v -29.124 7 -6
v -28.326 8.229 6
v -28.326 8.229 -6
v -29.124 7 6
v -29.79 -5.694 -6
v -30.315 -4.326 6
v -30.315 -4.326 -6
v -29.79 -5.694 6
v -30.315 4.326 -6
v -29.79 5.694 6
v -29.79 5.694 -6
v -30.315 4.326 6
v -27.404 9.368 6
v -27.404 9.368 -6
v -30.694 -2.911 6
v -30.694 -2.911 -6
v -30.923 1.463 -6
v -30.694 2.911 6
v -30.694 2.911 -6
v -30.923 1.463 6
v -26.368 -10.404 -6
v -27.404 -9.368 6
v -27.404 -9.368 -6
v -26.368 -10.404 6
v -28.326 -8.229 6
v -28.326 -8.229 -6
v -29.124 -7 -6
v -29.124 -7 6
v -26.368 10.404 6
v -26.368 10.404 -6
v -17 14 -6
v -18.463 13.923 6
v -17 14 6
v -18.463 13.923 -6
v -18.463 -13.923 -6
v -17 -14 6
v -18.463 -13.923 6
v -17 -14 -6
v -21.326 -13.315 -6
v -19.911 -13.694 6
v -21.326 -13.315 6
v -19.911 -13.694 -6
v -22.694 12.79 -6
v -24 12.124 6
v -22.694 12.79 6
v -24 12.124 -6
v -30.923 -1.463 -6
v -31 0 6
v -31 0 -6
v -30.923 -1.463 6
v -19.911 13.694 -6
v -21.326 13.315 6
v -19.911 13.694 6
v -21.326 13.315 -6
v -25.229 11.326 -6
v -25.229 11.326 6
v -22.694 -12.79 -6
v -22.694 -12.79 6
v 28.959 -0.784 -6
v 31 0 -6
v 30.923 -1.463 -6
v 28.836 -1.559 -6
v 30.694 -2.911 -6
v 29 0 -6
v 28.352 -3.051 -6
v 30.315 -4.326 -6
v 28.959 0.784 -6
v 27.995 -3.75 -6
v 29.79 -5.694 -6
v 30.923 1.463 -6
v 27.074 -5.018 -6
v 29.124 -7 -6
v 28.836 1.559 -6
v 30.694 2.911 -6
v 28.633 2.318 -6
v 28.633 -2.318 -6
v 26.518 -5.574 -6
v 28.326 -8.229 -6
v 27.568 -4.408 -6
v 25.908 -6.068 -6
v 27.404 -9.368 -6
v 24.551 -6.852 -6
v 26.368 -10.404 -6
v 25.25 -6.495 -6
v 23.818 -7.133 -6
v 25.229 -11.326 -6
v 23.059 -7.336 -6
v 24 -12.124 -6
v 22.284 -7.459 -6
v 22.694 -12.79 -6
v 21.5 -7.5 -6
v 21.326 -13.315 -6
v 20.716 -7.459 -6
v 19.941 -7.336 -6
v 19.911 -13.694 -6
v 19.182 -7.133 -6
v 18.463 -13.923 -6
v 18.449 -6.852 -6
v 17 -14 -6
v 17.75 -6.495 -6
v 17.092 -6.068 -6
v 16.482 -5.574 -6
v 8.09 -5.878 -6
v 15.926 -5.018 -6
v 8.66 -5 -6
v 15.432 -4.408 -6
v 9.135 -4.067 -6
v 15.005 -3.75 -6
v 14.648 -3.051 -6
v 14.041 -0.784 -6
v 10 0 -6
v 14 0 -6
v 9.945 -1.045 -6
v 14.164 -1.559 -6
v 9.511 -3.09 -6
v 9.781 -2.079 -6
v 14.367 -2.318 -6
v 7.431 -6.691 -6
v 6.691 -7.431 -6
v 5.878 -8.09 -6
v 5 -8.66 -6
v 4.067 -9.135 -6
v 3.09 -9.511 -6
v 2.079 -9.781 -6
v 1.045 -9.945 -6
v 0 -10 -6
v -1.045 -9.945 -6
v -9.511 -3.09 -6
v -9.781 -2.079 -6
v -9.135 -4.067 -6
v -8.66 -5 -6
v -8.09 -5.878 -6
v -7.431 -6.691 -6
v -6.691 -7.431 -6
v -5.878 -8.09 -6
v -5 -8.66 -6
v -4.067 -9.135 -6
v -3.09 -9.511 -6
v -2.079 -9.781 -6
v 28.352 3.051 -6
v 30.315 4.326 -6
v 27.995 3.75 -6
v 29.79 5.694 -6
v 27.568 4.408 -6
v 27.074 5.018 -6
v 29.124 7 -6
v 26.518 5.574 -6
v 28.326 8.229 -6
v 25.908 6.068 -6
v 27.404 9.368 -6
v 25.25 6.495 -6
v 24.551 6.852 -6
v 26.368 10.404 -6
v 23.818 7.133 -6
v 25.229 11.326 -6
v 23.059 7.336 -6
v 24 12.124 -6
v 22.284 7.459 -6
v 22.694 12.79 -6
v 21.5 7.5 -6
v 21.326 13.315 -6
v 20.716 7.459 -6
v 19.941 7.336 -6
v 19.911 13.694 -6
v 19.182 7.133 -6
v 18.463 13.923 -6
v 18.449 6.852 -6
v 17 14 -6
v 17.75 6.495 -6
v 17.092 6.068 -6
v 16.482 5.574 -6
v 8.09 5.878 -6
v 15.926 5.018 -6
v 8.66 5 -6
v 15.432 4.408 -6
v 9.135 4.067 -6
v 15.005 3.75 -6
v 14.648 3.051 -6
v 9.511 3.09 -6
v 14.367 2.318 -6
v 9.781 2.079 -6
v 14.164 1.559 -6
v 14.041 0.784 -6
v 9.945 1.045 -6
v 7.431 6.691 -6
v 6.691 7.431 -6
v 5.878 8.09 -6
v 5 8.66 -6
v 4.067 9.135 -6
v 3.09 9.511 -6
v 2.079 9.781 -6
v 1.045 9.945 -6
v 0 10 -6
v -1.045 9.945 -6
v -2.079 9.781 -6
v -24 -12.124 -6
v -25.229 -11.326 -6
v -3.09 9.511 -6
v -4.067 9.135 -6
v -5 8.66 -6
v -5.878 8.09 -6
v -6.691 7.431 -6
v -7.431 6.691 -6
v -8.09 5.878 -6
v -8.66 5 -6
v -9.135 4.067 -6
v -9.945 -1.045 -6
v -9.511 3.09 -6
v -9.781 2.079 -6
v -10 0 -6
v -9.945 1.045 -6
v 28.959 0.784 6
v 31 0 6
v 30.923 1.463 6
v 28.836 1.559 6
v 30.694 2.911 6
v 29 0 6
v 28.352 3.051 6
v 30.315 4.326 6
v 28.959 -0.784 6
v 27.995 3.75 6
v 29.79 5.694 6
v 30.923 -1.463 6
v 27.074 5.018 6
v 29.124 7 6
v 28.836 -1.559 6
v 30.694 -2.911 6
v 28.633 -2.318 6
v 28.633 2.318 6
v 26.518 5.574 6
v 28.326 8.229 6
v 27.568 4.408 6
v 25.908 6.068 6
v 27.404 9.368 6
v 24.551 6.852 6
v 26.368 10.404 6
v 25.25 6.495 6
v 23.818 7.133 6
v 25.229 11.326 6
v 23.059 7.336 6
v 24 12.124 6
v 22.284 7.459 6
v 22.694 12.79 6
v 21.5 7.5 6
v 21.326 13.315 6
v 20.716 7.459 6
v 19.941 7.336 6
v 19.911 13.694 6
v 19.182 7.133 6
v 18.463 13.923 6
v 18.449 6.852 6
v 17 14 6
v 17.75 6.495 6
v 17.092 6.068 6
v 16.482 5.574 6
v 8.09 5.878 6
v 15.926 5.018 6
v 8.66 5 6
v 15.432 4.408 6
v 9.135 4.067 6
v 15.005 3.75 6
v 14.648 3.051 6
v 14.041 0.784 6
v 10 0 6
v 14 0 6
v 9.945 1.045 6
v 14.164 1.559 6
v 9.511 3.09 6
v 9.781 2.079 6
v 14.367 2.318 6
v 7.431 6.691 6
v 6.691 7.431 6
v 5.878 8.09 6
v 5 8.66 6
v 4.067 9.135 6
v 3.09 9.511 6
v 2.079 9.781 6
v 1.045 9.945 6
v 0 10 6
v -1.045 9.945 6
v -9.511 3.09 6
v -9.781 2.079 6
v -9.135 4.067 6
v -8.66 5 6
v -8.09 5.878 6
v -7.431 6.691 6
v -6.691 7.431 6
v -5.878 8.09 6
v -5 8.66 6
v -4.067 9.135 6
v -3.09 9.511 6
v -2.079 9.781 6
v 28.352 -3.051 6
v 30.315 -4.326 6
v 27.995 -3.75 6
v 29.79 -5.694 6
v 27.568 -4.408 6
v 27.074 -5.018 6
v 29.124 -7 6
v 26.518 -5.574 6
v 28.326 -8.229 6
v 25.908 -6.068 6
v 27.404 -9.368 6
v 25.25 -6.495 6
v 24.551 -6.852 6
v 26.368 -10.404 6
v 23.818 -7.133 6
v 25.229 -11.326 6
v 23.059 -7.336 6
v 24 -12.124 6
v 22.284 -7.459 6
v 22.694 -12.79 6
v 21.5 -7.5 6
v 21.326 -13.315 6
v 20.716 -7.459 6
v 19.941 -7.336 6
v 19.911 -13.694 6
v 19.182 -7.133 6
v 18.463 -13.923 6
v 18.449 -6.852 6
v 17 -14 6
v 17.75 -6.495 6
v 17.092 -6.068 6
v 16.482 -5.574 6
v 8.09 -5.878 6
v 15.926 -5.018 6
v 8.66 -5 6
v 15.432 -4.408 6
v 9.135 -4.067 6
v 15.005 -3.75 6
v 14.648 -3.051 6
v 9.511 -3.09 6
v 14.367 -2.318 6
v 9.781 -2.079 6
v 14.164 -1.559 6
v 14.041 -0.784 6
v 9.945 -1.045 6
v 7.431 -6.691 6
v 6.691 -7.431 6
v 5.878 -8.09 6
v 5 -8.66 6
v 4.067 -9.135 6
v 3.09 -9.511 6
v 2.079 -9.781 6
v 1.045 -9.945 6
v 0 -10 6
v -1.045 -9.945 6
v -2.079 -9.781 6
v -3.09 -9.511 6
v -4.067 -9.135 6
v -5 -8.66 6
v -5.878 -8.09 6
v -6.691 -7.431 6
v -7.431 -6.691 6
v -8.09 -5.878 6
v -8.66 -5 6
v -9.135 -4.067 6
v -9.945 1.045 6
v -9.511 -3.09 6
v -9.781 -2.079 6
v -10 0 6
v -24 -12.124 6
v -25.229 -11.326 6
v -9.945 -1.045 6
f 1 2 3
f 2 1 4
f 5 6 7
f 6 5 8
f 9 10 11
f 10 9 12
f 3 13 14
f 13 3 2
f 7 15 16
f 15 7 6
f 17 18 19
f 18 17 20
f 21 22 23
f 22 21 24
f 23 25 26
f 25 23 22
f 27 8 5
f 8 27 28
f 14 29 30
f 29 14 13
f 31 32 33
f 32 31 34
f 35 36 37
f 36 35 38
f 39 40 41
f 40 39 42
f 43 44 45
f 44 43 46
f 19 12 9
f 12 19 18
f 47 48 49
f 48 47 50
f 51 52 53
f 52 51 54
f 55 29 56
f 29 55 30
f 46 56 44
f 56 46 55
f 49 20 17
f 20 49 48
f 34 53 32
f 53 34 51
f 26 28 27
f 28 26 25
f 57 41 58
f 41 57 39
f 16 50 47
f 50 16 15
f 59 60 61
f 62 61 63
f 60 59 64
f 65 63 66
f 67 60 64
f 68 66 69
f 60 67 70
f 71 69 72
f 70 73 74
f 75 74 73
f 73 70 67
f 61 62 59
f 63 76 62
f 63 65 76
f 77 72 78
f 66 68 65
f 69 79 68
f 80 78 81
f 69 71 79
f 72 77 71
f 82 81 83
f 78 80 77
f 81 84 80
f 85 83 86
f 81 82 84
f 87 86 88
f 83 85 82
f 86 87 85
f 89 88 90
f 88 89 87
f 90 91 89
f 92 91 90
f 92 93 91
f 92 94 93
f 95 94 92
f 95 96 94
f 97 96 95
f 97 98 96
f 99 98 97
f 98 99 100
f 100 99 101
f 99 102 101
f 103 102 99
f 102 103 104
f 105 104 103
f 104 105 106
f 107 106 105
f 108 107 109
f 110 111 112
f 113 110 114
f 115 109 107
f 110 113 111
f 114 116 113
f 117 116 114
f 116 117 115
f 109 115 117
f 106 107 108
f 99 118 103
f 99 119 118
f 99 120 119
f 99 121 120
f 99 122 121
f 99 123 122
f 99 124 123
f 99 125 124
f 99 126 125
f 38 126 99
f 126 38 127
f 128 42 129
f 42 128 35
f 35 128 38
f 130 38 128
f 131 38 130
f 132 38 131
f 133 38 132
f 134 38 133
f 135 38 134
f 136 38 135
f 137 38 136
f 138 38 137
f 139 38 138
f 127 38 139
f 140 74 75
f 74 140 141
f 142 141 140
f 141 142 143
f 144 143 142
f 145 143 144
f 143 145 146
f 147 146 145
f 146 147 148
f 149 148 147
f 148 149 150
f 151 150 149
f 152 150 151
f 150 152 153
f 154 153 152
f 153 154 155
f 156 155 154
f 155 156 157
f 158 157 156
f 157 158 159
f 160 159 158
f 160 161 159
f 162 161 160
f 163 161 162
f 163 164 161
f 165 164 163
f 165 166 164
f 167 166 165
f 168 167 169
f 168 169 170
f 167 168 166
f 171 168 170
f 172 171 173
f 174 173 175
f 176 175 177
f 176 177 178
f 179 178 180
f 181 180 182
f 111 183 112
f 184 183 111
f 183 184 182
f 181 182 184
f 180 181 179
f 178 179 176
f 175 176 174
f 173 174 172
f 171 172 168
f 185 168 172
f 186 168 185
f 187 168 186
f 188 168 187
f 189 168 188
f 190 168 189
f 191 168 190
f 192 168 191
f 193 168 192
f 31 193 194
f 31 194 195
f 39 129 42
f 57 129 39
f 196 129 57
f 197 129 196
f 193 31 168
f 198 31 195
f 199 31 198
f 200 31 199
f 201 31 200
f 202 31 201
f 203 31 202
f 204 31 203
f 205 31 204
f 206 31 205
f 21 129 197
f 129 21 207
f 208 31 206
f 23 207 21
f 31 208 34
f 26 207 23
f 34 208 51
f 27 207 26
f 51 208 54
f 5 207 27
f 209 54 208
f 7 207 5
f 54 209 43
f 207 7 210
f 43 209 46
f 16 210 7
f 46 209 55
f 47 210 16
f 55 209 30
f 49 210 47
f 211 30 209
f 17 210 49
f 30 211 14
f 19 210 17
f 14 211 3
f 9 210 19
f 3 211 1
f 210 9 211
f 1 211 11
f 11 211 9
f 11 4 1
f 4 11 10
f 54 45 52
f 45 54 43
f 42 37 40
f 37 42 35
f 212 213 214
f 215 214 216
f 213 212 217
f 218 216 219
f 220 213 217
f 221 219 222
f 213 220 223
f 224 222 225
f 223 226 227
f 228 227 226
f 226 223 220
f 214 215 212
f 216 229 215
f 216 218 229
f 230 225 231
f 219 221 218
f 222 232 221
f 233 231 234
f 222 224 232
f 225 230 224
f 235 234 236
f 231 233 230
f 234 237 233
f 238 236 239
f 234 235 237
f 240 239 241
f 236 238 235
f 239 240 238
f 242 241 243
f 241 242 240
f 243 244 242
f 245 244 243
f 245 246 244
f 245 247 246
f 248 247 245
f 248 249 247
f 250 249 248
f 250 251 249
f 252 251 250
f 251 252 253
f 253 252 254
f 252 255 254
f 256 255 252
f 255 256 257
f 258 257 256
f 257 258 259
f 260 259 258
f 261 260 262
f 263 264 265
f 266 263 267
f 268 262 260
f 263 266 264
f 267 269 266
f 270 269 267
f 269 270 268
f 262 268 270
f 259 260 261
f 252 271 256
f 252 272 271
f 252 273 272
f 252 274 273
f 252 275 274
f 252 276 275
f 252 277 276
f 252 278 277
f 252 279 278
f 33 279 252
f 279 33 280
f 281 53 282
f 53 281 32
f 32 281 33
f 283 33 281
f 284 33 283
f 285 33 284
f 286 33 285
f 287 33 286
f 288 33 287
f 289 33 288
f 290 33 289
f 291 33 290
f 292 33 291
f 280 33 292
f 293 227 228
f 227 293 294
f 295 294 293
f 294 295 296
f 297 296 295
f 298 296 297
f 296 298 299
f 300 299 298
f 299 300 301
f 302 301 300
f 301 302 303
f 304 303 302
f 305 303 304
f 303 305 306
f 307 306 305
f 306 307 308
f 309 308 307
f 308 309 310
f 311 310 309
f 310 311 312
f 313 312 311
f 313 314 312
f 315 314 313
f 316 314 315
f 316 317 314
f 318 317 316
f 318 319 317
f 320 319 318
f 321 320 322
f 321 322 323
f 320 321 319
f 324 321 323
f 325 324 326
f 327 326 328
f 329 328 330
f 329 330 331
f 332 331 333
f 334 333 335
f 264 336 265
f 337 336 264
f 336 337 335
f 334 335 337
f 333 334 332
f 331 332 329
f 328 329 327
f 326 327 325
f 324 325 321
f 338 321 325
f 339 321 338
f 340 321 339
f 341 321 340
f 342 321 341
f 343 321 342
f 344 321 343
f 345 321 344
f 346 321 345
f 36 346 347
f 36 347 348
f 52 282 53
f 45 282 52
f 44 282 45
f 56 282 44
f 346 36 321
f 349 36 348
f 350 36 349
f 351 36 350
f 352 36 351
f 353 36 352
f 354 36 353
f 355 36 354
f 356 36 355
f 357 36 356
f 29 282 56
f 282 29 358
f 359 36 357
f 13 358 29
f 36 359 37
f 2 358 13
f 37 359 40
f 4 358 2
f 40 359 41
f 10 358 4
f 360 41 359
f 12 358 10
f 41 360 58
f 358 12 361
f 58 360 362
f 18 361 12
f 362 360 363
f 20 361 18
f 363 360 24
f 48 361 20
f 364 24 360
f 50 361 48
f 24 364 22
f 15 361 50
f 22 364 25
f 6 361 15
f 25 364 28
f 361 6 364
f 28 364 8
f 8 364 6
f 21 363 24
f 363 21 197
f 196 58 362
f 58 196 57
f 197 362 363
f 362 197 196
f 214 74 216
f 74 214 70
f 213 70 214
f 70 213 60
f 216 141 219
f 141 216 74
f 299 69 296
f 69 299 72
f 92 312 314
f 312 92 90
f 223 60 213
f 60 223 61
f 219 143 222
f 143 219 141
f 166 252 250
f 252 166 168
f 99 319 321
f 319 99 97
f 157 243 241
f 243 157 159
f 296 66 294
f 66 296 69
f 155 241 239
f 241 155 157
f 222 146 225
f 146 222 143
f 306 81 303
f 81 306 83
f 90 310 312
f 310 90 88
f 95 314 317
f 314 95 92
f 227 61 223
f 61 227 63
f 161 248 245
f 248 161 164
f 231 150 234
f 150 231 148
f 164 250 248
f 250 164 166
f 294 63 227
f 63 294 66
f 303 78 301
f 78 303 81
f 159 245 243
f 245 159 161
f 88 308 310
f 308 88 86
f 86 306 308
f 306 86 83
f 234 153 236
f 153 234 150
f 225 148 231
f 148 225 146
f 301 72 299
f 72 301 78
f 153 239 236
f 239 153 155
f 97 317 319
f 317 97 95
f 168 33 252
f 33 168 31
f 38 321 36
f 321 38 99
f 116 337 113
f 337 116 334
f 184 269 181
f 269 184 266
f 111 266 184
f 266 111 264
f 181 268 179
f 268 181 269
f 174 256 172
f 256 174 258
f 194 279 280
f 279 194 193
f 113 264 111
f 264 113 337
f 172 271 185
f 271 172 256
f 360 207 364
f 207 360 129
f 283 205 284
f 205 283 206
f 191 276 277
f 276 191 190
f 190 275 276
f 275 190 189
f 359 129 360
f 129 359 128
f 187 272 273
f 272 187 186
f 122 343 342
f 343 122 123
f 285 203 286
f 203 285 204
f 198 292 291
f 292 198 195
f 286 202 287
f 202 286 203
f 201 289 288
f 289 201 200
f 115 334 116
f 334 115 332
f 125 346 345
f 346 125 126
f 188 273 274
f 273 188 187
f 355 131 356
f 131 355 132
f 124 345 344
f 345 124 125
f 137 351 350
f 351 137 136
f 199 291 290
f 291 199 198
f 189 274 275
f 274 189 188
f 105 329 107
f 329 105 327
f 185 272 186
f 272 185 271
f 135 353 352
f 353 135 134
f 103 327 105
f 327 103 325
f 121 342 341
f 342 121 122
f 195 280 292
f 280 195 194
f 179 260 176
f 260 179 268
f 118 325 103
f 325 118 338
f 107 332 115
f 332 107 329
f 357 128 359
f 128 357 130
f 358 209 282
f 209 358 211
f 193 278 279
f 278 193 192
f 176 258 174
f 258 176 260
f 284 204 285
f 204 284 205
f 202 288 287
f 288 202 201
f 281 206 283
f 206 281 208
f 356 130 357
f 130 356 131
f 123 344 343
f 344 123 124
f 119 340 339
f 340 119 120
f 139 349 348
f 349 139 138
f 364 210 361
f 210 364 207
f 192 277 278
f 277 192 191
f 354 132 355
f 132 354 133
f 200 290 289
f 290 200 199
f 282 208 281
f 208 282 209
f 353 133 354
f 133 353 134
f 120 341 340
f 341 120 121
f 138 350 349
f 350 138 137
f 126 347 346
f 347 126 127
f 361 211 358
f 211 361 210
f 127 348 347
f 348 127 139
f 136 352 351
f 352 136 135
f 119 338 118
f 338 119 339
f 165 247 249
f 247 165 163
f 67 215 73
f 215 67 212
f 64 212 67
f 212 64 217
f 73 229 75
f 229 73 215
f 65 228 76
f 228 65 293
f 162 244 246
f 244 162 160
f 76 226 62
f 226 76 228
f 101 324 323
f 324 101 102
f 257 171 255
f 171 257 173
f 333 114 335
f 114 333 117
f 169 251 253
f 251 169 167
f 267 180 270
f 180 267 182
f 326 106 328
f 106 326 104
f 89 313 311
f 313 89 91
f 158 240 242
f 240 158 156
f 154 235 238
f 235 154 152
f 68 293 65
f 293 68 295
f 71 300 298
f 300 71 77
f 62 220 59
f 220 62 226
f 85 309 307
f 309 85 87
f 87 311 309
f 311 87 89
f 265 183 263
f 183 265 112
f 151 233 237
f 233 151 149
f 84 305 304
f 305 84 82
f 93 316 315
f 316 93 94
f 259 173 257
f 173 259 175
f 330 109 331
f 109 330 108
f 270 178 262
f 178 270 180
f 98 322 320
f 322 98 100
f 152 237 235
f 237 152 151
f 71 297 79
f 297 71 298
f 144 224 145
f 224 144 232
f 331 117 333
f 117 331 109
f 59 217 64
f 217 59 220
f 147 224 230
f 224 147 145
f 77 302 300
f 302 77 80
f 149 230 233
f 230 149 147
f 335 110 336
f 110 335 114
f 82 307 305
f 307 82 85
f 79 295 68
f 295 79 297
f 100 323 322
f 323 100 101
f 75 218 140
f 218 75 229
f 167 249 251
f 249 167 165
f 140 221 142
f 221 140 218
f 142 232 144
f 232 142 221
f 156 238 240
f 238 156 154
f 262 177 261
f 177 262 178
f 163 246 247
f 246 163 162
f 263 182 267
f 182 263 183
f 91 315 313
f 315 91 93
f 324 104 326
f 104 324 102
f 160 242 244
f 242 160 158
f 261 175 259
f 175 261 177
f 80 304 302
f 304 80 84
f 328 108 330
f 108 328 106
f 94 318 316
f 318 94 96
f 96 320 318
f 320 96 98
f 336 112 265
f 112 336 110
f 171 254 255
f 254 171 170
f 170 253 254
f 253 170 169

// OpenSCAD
dremel_accessory_diam = 20;
dremel_accesory_height = 12;

aspirator_thickness_thick = 4;
aspirator_thickness_slim = 2;

aspirator_tube_diam = 15;
aspirator_tube_holder_height = 15;

aspirator_hole_height = 15;
aspirator_hole_diam = 15;

dremel_wrench_diam = 25;

// Useful MCAD functions reference

//use <MCAD/motors.scad>
//stepper_motor_mount(nema_standard=17, slide_distance=10, $fn=40, mochup=true);

//use <MCAD/boxes.scad>
//roundedBox([10,20,30], radius=2, sidesonly=false, $fn=60);

//include <MCAD/stepper.scad>
//motor(Nema17, size=NemaMedium, dualAxis=false);


//use <MCAD/teardrop.scad>
//teardrop(radius=10, length=20, angle=90);

//use <MCAD/nuts_and_bolts.scad>
//nutHole(size=3, tolerance=0.5, proj=-1);
//boltHole(size=3, length=10, tolerance=0.5, proj=-1, $fn=40);


use <MCAD/boxes.scad>


difference() {
	roundedBox([dremel_accessory_diam+aspirator_tube_diam*2+aspirator_thickness_thick*3,
		dremel_accessory_diam+aspirator_thickness_thick*2,
		dremel_accesory_height],
		radius=(dremel_accessory_diam+aspirator_thickness_thick*2)/2,
		sidesonly=true, $fn=60);
	
	cylinder(r=dremel_accessory_diam/2, h=dremel_accesory_height+0.1, $fn=60,center=true);
	translate([dremel_accessory_diam/2+aspirator_tube_diam/2+aspirator_thickness_thick,0,0])
		cylinder(r=aspirator_tube_diam/2, h=dremel_accesory_height+0.1, $fn=60,center=true);
}
